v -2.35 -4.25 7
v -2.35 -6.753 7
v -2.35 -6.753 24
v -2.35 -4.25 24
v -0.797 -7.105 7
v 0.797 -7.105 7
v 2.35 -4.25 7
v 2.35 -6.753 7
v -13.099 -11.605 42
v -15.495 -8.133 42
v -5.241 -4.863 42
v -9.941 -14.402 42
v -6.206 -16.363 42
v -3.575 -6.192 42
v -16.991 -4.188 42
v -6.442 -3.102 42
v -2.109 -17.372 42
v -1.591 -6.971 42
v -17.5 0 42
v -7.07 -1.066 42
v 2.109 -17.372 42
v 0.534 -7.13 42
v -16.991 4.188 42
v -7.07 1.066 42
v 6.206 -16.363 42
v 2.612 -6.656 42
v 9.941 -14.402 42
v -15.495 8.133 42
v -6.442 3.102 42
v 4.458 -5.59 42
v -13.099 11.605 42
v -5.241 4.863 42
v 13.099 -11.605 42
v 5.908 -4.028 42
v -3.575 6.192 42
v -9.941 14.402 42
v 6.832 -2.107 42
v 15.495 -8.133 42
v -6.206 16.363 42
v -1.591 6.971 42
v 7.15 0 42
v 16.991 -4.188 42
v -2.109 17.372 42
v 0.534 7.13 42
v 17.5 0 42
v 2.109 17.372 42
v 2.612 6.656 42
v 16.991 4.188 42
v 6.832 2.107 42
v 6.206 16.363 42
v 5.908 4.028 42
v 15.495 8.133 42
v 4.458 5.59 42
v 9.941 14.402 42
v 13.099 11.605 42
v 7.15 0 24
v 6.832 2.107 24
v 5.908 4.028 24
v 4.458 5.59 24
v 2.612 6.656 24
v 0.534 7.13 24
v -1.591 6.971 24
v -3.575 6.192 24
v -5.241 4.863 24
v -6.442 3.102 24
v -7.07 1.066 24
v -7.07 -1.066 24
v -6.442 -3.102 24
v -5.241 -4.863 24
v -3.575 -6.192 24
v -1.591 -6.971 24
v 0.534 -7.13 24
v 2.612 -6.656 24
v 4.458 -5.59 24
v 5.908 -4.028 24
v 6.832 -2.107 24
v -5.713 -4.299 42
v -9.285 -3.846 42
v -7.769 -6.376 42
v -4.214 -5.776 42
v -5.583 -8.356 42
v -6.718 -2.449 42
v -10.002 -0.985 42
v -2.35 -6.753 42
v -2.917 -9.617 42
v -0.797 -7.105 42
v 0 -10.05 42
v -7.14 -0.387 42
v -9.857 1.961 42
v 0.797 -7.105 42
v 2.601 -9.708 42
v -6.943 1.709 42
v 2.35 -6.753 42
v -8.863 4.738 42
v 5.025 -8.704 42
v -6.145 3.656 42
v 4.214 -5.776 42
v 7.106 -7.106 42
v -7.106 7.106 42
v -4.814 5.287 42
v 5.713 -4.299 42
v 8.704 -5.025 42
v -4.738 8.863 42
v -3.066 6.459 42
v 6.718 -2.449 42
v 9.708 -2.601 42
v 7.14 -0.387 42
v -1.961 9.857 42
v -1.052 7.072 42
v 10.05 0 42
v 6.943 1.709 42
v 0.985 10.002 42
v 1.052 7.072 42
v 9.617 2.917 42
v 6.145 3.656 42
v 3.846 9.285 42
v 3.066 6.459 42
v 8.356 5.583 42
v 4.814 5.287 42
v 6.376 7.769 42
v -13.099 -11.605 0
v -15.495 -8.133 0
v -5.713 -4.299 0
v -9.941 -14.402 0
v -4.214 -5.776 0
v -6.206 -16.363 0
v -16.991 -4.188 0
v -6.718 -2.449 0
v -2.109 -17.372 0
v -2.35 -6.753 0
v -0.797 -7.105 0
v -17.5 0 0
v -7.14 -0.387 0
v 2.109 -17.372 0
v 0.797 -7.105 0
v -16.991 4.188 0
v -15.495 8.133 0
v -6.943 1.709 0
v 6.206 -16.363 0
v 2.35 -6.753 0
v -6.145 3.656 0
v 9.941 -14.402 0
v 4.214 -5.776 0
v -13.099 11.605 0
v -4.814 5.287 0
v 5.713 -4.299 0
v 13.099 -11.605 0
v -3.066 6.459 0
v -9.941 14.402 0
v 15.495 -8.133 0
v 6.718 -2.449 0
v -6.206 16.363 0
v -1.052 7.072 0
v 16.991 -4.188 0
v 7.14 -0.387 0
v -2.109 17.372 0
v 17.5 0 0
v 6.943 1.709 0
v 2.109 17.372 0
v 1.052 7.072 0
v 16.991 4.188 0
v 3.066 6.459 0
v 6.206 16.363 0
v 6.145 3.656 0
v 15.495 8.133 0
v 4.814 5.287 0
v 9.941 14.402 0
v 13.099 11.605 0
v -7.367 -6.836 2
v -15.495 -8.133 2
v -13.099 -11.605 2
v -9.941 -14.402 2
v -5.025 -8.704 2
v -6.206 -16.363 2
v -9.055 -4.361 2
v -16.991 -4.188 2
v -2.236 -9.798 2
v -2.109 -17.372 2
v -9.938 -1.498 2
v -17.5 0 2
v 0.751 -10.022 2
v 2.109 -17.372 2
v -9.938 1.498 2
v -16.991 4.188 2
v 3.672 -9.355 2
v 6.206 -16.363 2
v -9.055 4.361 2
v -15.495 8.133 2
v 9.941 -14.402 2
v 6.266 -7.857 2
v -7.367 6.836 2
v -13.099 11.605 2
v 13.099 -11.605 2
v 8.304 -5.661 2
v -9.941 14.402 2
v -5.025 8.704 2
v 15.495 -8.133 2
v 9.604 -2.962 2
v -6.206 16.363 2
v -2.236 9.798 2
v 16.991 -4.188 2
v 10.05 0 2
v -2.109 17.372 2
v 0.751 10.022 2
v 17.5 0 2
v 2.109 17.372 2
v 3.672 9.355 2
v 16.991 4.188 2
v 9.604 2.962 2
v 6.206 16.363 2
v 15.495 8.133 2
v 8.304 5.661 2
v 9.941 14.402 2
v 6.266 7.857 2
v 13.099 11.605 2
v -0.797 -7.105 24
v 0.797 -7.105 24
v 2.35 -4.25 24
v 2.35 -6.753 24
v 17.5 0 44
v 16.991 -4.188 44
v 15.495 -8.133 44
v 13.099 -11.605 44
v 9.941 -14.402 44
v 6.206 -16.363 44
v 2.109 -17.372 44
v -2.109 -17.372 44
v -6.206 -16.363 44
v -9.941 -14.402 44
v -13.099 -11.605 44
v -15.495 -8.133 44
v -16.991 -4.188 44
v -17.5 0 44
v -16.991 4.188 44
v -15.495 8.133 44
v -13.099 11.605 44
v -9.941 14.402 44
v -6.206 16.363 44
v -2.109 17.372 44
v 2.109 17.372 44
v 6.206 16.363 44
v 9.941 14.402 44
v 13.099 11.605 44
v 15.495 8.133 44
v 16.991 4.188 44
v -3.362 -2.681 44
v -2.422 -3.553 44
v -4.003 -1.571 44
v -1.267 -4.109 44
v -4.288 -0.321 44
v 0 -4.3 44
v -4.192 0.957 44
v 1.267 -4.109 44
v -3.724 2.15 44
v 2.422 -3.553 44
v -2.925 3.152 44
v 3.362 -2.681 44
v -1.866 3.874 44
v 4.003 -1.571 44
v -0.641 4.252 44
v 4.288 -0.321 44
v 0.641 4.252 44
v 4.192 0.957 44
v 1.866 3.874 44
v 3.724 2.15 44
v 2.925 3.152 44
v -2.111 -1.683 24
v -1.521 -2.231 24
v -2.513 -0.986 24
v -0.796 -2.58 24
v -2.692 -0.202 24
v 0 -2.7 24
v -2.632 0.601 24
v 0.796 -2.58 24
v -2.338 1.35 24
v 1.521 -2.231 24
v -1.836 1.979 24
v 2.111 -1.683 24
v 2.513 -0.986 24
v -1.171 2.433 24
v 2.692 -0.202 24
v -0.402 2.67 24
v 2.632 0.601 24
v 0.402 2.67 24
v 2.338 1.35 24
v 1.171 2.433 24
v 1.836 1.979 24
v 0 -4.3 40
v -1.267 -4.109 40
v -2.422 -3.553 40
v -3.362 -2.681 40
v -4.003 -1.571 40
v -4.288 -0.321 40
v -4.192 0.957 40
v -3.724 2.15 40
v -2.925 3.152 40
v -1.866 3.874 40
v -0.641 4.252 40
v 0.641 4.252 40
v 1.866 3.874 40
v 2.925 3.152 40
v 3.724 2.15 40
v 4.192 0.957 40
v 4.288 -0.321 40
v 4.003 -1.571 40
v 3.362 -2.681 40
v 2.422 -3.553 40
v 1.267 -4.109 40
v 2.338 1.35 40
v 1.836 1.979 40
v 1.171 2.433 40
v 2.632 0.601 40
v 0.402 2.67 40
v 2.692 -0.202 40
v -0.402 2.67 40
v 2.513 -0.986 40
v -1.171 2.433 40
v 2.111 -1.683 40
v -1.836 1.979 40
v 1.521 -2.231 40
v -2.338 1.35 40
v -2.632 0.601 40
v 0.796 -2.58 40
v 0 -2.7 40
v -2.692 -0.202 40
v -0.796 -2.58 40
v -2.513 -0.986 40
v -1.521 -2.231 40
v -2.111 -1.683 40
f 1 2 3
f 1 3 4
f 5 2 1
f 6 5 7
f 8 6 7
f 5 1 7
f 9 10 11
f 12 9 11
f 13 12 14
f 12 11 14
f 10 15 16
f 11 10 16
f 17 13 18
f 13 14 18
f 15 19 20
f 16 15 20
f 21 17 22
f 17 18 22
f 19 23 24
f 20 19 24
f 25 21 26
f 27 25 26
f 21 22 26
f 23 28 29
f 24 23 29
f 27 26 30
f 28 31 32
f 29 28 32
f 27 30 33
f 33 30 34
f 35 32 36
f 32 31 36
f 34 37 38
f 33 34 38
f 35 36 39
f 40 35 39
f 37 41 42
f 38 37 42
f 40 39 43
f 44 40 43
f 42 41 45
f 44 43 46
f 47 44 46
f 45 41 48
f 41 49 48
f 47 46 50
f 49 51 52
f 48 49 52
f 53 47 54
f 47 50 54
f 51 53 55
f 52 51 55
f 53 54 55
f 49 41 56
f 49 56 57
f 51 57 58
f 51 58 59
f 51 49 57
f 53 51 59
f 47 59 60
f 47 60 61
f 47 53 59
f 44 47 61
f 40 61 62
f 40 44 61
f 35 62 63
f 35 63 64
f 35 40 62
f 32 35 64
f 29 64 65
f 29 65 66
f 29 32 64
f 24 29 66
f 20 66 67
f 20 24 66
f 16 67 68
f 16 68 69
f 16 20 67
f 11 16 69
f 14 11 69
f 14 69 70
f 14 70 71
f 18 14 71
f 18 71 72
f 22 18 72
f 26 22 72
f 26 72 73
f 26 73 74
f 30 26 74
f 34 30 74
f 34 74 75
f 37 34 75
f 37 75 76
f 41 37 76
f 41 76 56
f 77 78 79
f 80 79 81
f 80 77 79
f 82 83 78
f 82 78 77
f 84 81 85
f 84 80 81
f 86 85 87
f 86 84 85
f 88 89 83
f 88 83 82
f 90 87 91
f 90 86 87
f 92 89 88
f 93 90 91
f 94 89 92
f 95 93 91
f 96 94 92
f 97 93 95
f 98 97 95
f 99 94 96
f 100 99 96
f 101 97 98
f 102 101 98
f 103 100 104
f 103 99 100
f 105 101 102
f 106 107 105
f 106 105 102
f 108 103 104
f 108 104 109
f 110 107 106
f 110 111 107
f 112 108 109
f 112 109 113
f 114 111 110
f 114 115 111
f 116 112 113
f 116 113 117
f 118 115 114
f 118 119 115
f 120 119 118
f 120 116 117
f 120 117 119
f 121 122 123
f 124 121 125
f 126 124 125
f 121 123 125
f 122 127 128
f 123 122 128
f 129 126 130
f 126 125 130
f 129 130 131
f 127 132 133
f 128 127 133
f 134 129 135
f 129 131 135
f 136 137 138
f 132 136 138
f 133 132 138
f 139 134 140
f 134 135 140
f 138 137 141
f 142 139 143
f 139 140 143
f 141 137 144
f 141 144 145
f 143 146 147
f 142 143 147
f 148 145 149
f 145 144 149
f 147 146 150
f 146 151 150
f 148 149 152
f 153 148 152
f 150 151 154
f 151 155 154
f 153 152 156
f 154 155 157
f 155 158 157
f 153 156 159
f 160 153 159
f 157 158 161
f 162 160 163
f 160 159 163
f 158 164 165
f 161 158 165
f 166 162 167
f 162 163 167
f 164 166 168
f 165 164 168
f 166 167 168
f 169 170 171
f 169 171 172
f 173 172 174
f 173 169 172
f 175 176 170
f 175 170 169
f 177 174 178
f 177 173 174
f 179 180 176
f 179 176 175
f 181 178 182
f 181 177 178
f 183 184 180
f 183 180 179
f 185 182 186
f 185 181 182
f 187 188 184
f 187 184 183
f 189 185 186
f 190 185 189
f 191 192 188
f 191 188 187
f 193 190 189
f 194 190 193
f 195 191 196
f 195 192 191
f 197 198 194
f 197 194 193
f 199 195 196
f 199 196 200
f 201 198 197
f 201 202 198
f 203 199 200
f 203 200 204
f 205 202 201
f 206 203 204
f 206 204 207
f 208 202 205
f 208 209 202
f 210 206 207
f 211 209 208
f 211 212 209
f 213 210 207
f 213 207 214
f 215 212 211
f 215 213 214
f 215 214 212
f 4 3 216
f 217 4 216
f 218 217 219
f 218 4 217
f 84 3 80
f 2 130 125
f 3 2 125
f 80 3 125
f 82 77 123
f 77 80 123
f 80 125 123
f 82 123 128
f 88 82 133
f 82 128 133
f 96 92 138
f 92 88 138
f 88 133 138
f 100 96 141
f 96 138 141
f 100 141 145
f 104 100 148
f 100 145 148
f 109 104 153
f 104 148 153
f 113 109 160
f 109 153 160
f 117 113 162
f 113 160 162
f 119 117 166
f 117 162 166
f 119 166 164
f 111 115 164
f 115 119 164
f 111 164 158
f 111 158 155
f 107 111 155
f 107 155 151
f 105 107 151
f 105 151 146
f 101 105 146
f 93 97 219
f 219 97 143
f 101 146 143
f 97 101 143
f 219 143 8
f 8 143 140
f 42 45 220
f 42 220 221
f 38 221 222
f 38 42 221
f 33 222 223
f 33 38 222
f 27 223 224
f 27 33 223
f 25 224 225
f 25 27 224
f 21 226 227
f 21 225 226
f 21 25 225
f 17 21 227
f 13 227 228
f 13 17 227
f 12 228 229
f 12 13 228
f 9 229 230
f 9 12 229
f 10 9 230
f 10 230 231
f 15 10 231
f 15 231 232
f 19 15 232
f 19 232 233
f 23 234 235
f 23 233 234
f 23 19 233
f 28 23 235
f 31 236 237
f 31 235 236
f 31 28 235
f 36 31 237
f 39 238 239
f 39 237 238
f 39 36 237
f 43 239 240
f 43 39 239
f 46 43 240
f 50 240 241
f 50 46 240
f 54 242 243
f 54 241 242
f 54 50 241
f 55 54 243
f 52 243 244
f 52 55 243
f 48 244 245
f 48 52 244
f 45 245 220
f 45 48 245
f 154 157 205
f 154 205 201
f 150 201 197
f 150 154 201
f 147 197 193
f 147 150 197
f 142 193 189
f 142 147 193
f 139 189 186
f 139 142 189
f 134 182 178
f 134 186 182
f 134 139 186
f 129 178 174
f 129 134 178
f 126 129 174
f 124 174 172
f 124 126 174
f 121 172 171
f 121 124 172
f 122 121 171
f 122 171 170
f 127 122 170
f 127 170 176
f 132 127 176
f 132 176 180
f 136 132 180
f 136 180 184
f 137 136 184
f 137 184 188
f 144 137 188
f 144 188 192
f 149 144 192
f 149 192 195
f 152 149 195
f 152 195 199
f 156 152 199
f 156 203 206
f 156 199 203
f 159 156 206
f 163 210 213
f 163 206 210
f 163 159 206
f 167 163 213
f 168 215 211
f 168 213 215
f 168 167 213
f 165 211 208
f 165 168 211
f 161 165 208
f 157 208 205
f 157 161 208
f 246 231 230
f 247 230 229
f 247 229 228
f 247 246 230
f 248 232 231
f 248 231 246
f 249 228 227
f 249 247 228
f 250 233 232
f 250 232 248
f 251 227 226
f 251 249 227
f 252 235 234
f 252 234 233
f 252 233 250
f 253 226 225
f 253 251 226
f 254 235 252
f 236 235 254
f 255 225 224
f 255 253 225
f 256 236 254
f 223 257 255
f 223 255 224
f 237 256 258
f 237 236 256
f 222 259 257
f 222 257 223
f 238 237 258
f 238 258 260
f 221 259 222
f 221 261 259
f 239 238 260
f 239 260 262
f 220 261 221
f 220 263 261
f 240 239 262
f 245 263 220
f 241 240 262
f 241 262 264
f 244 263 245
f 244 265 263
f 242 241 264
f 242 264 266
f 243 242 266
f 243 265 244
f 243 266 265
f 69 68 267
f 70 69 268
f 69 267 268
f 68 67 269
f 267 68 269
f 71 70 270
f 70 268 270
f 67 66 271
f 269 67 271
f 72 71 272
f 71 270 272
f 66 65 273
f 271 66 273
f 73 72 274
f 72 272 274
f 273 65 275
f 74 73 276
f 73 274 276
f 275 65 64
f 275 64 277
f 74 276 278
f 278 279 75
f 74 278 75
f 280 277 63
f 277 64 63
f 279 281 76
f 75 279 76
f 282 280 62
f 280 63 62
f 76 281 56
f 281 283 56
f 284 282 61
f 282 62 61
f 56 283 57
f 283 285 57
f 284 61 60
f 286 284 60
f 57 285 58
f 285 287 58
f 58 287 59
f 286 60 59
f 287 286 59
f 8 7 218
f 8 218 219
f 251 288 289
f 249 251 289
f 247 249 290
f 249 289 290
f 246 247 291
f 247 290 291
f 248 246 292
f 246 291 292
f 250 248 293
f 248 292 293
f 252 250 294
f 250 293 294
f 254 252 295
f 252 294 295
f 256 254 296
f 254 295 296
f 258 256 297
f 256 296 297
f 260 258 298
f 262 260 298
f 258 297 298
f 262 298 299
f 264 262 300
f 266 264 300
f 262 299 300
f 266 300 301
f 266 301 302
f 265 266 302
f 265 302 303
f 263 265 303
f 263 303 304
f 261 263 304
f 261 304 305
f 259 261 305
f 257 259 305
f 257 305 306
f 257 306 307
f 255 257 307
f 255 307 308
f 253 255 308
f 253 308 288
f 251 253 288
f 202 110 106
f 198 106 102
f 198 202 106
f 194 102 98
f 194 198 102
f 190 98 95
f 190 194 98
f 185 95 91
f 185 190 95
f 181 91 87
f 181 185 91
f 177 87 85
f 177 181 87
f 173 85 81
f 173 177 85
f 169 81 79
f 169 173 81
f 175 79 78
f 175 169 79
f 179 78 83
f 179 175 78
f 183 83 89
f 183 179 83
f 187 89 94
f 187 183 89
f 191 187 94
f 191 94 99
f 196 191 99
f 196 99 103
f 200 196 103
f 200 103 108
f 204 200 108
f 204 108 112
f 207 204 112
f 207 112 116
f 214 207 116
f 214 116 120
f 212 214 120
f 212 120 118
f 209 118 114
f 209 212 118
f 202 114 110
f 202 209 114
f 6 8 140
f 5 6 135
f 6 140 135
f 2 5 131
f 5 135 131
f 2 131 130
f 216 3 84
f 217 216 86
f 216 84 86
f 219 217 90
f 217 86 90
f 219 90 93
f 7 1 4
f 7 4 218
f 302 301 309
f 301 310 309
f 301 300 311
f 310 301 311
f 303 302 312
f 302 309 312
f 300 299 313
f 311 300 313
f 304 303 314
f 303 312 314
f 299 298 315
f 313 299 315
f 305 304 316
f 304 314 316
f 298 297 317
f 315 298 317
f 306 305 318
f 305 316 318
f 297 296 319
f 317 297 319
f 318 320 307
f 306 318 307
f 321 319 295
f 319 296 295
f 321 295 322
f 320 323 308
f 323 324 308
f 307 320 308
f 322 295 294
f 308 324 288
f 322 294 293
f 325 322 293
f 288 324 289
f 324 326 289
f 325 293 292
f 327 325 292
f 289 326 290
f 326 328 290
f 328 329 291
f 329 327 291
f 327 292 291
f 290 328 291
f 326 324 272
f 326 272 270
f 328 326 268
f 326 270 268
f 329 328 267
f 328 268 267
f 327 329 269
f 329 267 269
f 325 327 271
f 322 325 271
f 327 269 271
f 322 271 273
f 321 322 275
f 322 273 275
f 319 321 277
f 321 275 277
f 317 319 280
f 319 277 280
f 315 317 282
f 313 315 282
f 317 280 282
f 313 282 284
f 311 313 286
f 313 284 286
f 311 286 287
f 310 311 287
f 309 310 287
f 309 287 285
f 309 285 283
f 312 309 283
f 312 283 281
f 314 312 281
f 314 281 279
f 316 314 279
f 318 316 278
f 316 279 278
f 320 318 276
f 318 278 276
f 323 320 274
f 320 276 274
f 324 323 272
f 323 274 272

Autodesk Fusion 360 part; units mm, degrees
sketch "Sketch1" plane through (0, 0, 0) normal (0, 0, 1) x (1, 0, 0)
  circle A0 centre (0, 0) radius 10.05
  line L0 (2.35, -4.25) -> (2.35, -9.45)
  line L1 (-2.35, -4.25) -> (2.35, -4.25)
  line L2 (-2.35, -4.25) -> (2.35, -9.45) construction
  line L3 (2.35, -9.45) -> (-2.35, -9.45)
  line L4 (2.35, -4.25) -> (-2.35, -9.45) construction
  line L5 (-2.35, -9.45) -> (-2.35, -4.25)
  circle A1 centre (0, 0) radius 7.15
  circle A2 centre (0, 0) radius 17.5
  line L6 (0, 0) -> (0, -12)
  point P0 (0, -6.85)
  dimension "d1" = 20.1
  dimension "d2" = 4.7
  dimension "d3" = 5.2
  dimension "d4" = 14.3
  dimension "d5" = 2.9
  dimension "d10" = 35
extrude "Extrude1" add sketch "Sketch1" along normal blind 42 contours L3 L5 A1 L6 | L0 L3 A1 L6 | A0 | L0 L1 A1 L6 | L1 L5 A1 L6 makes body 1
extrude "Extrude2" add sketch "Sketch1" along normal blind 2 contours A2 bodies 1
extrude "Extrude3" add sketch "Sketch1" along normal blind 2 from surface at 42 separate body contours L3 L5 A1 L6 | L0 L3 A1 L6 | A0 | L0 L1 A1 L6 | L1 L5 A1 L6 | A2 makes body 2
extrude "Extrude4" add sketch "Sketch1" against normal blind 20 from surface at 44 separate body contours L0 L1 A1 L6 | L1 L5 A1 L6 | L0 L1 L5 A1 makes body 3
combine "Combine1" operation add target body 2 tool bodies 3
move_face "OffsetFaces1" [suppressed]
sketch "Sketch2" plane through (0, 0, 44) normal (0, 0, 1) x (-1, 0, 0)
  circle A0 centre (0, 0) radius 17.5
  circle A1 centre (0, 0) radius 3
extrude "Extrude5" cut sketch "Sketch1" against normal blind 18 from surface at 42 contours L0 L1 A1 L6 | L1 L5 A1 L6 bodies 1
hole "Hole1" at (0, 0, 44) direction (0, 0, -1) diameter 5.4 depth 65 tip angle 118 counterbore diameter 8.6 counterbore depth 4 bodies 2
extrude "Extrude6" cut sketch "Sketch1" along normal blind 7 contours L0 L1 A1 L6 | L1 L5 A1 L6 bodies 1
